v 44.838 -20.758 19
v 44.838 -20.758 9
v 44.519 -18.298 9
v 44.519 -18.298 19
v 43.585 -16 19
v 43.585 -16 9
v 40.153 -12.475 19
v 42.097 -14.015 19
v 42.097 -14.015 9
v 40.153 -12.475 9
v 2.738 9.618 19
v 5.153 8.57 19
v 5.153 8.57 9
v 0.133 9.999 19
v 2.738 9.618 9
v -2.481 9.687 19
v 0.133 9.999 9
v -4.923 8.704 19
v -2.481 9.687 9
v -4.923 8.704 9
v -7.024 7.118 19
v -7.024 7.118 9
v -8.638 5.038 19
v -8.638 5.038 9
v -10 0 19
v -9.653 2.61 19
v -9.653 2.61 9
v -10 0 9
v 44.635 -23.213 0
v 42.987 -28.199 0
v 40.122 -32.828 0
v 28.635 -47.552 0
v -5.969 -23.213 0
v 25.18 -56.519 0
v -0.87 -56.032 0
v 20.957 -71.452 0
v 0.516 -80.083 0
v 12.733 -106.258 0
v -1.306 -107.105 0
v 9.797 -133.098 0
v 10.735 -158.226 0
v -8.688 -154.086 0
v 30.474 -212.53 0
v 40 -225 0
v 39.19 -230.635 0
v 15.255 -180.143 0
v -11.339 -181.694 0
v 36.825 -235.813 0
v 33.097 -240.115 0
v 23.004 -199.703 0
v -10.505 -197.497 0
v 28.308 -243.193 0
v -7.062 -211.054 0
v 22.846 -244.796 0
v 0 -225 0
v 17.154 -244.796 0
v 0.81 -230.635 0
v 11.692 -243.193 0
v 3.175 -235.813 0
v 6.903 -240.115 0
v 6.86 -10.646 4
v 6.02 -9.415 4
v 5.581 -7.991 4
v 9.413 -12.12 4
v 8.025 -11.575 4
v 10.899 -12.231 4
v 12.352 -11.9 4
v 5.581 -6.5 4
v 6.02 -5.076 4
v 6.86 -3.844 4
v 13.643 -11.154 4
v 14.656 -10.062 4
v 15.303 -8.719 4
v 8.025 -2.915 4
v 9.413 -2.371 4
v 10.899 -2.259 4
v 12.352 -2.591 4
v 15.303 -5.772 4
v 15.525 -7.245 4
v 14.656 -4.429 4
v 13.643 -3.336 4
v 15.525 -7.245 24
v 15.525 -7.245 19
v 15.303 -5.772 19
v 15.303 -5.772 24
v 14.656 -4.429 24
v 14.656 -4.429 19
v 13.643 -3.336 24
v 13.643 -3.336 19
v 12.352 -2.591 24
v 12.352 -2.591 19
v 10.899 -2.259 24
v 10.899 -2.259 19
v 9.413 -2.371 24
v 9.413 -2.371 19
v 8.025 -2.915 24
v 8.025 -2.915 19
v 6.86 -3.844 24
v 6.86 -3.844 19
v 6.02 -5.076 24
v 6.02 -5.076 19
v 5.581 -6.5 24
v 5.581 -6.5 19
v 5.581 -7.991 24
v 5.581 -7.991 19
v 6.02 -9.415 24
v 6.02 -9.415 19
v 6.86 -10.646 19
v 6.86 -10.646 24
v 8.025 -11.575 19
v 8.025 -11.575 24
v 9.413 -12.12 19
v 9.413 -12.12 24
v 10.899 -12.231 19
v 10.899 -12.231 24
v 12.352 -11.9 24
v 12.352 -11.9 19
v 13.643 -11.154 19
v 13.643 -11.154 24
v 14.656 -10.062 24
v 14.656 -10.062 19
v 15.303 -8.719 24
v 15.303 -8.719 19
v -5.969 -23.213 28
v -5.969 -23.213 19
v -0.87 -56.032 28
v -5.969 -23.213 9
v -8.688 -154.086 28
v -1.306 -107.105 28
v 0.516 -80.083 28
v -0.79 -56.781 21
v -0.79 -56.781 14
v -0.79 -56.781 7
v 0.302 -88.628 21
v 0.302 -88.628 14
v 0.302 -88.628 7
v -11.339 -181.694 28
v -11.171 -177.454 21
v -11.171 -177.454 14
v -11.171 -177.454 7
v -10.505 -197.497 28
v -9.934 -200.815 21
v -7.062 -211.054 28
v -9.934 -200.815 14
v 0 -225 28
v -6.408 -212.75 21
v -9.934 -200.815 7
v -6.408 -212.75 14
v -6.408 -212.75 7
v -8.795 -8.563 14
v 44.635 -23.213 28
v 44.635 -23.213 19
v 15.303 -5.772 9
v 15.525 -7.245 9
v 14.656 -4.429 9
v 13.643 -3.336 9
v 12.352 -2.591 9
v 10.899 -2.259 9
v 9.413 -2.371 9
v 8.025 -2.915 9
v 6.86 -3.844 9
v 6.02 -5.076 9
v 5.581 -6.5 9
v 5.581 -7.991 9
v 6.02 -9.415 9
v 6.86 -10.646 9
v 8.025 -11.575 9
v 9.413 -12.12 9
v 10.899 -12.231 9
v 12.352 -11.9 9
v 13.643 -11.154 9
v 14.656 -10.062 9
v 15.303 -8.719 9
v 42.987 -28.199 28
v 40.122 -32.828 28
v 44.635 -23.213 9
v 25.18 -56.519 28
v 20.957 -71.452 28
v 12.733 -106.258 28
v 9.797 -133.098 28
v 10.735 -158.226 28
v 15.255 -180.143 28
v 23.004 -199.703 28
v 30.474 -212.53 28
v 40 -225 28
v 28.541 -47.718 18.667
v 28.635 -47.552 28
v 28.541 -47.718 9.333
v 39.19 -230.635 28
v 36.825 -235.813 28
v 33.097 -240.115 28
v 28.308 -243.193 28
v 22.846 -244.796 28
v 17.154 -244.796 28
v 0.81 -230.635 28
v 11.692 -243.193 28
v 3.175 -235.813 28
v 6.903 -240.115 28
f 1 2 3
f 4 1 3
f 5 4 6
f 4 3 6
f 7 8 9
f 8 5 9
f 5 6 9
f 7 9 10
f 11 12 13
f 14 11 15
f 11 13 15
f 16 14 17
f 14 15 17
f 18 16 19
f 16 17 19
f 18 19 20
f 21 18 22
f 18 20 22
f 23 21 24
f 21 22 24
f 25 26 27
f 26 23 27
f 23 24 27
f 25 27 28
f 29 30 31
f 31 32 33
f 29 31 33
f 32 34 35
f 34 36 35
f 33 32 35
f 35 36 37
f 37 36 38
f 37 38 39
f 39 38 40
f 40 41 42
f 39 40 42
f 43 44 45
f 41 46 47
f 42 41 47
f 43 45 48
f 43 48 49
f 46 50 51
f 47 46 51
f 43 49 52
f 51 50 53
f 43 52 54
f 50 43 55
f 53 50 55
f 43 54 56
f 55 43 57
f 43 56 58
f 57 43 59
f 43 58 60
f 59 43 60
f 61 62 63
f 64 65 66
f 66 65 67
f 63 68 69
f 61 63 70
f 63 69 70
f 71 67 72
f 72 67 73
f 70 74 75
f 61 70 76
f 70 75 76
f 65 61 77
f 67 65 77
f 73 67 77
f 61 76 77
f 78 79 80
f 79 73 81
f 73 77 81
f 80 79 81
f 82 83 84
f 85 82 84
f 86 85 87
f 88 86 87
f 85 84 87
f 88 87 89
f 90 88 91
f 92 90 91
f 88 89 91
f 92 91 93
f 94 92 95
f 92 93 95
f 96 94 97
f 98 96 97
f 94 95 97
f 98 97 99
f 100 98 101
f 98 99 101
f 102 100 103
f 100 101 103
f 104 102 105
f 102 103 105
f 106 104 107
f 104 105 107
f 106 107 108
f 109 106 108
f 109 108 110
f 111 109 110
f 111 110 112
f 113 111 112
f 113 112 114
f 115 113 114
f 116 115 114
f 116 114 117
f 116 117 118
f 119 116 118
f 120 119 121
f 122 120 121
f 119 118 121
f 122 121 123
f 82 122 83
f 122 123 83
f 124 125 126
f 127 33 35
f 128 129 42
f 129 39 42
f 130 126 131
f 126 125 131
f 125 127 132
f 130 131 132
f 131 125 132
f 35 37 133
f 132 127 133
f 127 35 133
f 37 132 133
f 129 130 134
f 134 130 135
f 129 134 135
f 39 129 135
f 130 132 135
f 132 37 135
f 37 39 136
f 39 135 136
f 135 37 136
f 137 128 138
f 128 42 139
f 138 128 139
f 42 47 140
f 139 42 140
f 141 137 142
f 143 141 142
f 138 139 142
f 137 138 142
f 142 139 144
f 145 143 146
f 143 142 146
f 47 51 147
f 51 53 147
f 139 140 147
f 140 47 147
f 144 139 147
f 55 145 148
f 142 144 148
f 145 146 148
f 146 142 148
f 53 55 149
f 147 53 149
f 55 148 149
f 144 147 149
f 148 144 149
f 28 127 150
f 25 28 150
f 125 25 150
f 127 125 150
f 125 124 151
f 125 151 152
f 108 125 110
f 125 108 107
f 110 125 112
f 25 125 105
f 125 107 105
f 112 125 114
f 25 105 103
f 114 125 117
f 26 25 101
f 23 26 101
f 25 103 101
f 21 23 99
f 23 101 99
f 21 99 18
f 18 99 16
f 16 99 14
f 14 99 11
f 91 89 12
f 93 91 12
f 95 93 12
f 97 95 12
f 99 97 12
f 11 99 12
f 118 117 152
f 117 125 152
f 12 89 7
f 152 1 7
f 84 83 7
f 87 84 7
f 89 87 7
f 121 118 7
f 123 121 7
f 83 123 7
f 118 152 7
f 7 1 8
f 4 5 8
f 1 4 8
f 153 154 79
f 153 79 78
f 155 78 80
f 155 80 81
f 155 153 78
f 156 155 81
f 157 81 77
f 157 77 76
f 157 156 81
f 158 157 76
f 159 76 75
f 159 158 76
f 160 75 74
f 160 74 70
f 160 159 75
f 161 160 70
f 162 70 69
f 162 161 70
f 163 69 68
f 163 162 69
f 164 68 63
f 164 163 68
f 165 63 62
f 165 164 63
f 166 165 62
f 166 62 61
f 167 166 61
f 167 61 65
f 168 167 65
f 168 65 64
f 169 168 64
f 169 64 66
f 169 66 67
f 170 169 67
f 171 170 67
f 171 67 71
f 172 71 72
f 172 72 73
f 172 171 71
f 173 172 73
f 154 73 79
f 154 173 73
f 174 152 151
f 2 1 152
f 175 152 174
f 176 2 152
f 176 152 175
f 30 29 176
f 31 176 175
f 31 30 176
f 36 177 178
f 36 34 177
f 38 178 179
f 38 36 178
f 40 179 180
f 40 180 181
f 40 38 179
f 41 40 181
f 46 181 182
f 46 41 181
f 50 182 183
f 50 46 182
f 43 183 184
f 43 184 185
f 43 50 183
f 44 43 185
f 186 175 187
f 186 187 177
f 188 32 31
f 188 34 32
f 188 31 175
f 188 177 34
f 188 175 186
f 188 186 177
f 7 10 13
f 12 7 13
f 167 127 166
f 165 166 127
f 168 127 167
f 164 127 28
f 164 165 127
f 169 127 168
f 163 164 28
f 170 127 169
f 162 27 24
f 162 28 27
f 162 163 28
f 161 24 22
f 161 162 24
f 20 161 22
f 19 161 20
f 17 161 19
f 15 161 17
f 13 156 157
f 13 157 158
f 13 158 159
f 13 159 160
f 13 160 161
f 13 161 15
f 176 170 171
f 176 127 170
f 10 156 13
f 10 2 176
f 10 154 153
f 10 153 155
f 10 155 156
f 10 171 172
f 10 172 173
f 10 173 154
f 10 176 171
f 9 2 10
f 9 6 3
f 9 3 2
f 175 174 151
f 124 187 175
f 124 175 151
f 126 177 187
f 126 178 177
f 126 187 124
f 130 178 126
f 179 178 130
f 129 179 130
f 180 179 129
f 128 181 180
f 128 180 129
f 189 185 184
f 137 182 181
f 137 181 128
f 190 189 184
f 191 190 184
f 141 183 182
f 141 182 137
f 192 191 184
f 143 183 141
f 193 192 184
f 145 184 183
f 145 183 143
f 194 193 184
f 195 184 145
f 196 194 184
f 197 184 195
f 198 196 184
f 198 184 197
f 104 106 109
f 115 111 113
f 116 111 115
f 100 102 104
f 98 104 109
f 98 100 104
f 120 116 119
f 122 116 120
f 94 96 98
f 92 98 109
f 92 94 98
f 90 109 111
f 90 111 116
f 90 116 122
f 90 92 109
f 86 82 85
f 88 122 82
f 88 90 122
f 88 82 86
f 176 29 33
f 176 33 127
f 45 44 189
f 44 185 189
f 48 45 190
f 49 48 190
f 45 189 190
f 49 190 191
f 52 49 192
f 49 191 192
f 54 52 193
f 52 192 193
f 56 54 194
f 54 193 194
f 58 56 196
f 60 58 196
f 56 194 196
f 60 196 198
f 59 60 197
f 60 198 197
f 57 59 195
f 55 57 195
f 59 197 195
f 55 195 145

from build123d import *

# Parameters (mm, degrees)
BOSS_EXTRUDE1_DEPTH = 28
SKETCH4_W           = 20
SKETCH4_H           = 28
REVOLVE2_ANGLE      = 180
SKETCH8_W           = 9
SKETCH8_H           = 33.21296959
CUT_EXTRUDE1_DEPTH  = 45
SKETCH9_R           = 5
BOSS_EXTRUDE2_DEPTH = 5


with BuildPart() as part:
    # Sketch1 → Boss-Extrude1 (new body)
    with BuildSketch(Plane.XY):
        with BuildLine():
            Line((0, -225), (40, -225))
            add(Edge.make_bspline(
                [(44.837749122, -20.758189433), (44.837749122, -31.369390936), (28.889425137, -41.782899382), (19.026841833, -81.321540561), (-10.380022908, -166.862499306), (40, -225)],
                knots=[0, 0, 0, 0, 0.243335168, 0.343335168, 1, 1, 1, 1], degree=3))
            ThreePointArc((44.837749122, -20.758189433), (43.585451091, -16.000112379), (40.153070139, -12.475015414))
            Line((40.153070139, -12.475015414), (5.153070139, 8.570056484))
            ThreePointArc((5.153070139, 8.570056484), (-4.922870027, 8.704329423), (-10, 0))
            add(Edge.make_bspline(
                [(-10, 0), (-10, -6.033622411), (-1.935159008, -36.567795894), (2.930618137, -106.909125291), (-14.496902926, -160.944662091), (-10.77837774, -208.408825579), (0, -225)],
                knots=[0, 0, 0, 0, 0.308474866, 0.388557837, 0.800829708, 1, 1, 1, 1], degree=3))
        make_face()
    extrude(amount=BOSS_EXTRUDE1_DEPTH)

    # Sketch4 → Revolve2 (revolve)
    with BuildSketch(Plane.XZ.offset(225)):
        with Locations((30, 14)):
            Rectangle(SKETCH4_W, SKETCH4_H)
    revolve(axis=Axis((20, -225, 28), (0, 0, -1)), revolution_arc=REVOLVE2_ANGLE)

    # Sketch8 → Cut-Extrude1 (cut, symmetric)
    with BuildSketch(Plane(origin=(0, 0, 0), x_dir=(0, 0, -1), z_dir=(1, 0, 0))):
        with Locations((-23.5, -6.606484795)):
            Rectangle(SKETCH8_W, SKETCH8_H)
    cut_extrude1 = extrude(amount=CUT_EXTRUDE1_DEPTH, both=True, mode=Mode.SUBTRACT)

    # Mirror1: Cut-Extrude1 across plane
    add(cut_extrude1.mirror(Plane.XY.offset(14)), mode=Mode.SUBTRACT)

    # Sketch9 → Boss-Extrude2 (add)
    with BuildSketch(Plane.XY.offset(19)):
        with Locations((10.525146493, -7.245327121)):
            Circle(SKETCH9_R)
    boss_extrude2 = extrude(amount=BOSS_EXTRUDE2_DEPTH)

    # Mirror2: Boss-Extrude2 across plane
    add(boss_extrude2.mirror(Plane.XY.offset(14)))


solid = part.part
